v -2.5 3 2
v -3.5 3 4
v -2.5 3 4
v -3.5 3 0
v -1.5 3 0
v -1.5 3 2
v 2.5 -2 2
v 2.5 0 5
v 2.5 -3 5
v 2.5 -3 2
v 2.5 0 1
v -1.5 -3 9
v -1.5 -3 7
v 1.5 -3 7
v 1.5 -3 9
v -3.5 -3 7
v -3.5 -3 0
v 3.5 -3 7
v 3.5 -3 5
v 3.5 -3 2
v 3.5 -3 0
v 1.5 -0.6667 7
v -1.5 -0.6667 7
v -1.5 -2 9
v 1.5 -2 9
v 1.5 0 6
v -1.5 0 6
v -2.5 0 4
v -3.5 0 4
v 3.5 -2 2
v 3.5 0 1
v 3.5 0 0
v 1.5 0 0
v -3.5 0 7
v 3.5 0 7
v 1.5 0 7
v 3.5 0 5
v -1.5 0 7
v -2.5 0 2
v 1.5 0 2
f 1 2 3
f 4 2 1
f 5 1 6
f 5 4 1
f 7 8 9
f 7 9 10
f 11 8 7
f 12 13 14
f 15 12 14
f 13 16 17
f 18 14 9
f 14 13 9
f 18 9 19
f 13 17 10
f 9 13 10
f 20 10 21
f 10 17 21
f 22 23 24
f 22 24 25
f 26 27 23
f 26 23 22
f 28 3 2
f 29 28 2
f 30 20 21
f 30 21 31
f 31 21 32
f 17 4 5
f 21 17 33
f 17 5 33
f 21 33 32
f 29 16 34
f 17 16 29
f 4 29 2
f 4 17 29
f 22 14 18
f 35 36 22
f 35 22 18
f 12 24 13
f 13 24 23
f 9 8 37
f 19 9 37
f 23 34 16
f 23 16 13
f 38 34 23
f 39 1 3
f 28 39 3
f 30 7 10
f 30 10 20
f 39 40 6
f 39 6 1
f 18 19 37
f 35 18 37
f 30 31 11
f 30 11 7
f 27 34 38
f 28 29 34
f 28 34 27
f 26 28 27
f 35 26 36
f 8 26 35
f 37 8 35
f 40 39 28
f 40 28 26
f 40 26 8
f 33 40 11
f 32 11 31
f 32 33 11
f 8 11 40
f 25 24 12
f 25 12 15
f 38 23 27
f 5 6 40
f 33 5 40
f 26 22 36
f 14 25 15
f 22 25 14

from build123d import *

# Parameters (mm, degrees)
SKETCH1_W           = 7
SKETCH1_H           = 6
BOSS_EXTRUDE1_DEPTH = 9
SKETCH2_W           = 2
SKETCH2_H           = 2
SKETCH2_W_2         = 1
SKETCH2_H_2         = 3
CUT_EXTRUDE1_DEPTH  = 7
SKETCH3_OUTSIDE_W   = 11.576
SKETCH3_OUTSIDE_H   = 13.576
CUT_EXTRUDE3_DEPTH  = 3
CUT_EXTRUDE4_DEPTH  = 3
CUT_EXTRUDE5_DEPTH  = 1
SKETCH8_W           = 3
SKETCH8_H           = 3.605551275
CUT_EXTRUDE6_DEPTH  = 5.160251472


with BuildPart() as part:
    # Sketch1 → Boss-Extrude1 (new body)
    with BuildSketch(Plane.XY):
        Rectangle(SKETCH1_W, SKETCH1_H)
    extrude(amount=BOSS_EXTRUDE1_DEPTH)

    # Sketch2 → Cut-Extrude1 (cut, through all)
    with BuildSketch(Plane(origin=(0, 3, 0), x_dir=(1, 0, 0), z_dir=(0, 1, 0))):
        with Locations((-2.5, -8)):
            Rectangle(SKETCH2_W, SKETCH2_H)
        with Locations((2.5, -8)):
            Rectangle(SKETCH2_W, SKETCH2_H)
        with Locations((3, -3.5)):
            Rectangle(SKETCH2_W_2, SKETCH2_H_2)
    extrude(amount=-CUT_EXTRUDE1_DEPTH, mode=Mode.SUBTRACT)

    # Sketch3 outside → Cut-Extrude3 (cut)
    with BuildSketch(Plane(origin=(0, 3, 0), x_dir=(1, 0, 0), z_dir=(0, 1, 0))):
        with Locations((0, -4.5)):
            Rectangle(SKETCH3_OUTSIDE_W, SKETCH3_OUTSIDE_H)
        Polygon((1.5, 0), (1.5, -2), (-2.5, -2), (-2.5, -4), (-3.5, -4), (-3.5, 0), align=None, mode=Mode.SUBTRACT)
    extrude(amount=-CUT_EXTRUDE3_DEPTH, mode=Mode.SUBTRACT)

    # Sketch4 → Cut-Extrude4 (cut)
    with BuildSketch(Plane.XY.offset(2)):
        Polygon((-1.5, 3), (1.5, 0), (1.5, 3), align=None)
    extrude(amount=-CUT_EXTRUDE4_DEPTH, mode=Mode.SUBTRACT)

    # Sketch5 → Cut-Extrude5 (cut)
    with BuildSketch(Plane(origin=(3.5, 0, 0), x_dir=(0, 0, -1), z_dir=(1, 0, 0))):
        Polygon((-1, 0), (-2, -2), (-2, 0), align=None)
    extrude(amount=-CUT_EXTRUDE5_DEPTH, mode=Mode.SUBTRACT)

    # Sketch8 → Cut-Extrude6 (cut, through all)
    with BuildSketch(Plane(origin=(0, 2.769230769, 1.846153846), x_dir=(1, 0, 0), z_dir=(0, 0.832050294, 0.554700196))):
        with Locations((0, -6.795077404)):
            Rectangle(SKETCH8_W, SKETCH8_H)
    extrude(amount=CUT_EXTRUDE6_DEPTH, mode=Mode.SUBTRACT)


solid = part.part
